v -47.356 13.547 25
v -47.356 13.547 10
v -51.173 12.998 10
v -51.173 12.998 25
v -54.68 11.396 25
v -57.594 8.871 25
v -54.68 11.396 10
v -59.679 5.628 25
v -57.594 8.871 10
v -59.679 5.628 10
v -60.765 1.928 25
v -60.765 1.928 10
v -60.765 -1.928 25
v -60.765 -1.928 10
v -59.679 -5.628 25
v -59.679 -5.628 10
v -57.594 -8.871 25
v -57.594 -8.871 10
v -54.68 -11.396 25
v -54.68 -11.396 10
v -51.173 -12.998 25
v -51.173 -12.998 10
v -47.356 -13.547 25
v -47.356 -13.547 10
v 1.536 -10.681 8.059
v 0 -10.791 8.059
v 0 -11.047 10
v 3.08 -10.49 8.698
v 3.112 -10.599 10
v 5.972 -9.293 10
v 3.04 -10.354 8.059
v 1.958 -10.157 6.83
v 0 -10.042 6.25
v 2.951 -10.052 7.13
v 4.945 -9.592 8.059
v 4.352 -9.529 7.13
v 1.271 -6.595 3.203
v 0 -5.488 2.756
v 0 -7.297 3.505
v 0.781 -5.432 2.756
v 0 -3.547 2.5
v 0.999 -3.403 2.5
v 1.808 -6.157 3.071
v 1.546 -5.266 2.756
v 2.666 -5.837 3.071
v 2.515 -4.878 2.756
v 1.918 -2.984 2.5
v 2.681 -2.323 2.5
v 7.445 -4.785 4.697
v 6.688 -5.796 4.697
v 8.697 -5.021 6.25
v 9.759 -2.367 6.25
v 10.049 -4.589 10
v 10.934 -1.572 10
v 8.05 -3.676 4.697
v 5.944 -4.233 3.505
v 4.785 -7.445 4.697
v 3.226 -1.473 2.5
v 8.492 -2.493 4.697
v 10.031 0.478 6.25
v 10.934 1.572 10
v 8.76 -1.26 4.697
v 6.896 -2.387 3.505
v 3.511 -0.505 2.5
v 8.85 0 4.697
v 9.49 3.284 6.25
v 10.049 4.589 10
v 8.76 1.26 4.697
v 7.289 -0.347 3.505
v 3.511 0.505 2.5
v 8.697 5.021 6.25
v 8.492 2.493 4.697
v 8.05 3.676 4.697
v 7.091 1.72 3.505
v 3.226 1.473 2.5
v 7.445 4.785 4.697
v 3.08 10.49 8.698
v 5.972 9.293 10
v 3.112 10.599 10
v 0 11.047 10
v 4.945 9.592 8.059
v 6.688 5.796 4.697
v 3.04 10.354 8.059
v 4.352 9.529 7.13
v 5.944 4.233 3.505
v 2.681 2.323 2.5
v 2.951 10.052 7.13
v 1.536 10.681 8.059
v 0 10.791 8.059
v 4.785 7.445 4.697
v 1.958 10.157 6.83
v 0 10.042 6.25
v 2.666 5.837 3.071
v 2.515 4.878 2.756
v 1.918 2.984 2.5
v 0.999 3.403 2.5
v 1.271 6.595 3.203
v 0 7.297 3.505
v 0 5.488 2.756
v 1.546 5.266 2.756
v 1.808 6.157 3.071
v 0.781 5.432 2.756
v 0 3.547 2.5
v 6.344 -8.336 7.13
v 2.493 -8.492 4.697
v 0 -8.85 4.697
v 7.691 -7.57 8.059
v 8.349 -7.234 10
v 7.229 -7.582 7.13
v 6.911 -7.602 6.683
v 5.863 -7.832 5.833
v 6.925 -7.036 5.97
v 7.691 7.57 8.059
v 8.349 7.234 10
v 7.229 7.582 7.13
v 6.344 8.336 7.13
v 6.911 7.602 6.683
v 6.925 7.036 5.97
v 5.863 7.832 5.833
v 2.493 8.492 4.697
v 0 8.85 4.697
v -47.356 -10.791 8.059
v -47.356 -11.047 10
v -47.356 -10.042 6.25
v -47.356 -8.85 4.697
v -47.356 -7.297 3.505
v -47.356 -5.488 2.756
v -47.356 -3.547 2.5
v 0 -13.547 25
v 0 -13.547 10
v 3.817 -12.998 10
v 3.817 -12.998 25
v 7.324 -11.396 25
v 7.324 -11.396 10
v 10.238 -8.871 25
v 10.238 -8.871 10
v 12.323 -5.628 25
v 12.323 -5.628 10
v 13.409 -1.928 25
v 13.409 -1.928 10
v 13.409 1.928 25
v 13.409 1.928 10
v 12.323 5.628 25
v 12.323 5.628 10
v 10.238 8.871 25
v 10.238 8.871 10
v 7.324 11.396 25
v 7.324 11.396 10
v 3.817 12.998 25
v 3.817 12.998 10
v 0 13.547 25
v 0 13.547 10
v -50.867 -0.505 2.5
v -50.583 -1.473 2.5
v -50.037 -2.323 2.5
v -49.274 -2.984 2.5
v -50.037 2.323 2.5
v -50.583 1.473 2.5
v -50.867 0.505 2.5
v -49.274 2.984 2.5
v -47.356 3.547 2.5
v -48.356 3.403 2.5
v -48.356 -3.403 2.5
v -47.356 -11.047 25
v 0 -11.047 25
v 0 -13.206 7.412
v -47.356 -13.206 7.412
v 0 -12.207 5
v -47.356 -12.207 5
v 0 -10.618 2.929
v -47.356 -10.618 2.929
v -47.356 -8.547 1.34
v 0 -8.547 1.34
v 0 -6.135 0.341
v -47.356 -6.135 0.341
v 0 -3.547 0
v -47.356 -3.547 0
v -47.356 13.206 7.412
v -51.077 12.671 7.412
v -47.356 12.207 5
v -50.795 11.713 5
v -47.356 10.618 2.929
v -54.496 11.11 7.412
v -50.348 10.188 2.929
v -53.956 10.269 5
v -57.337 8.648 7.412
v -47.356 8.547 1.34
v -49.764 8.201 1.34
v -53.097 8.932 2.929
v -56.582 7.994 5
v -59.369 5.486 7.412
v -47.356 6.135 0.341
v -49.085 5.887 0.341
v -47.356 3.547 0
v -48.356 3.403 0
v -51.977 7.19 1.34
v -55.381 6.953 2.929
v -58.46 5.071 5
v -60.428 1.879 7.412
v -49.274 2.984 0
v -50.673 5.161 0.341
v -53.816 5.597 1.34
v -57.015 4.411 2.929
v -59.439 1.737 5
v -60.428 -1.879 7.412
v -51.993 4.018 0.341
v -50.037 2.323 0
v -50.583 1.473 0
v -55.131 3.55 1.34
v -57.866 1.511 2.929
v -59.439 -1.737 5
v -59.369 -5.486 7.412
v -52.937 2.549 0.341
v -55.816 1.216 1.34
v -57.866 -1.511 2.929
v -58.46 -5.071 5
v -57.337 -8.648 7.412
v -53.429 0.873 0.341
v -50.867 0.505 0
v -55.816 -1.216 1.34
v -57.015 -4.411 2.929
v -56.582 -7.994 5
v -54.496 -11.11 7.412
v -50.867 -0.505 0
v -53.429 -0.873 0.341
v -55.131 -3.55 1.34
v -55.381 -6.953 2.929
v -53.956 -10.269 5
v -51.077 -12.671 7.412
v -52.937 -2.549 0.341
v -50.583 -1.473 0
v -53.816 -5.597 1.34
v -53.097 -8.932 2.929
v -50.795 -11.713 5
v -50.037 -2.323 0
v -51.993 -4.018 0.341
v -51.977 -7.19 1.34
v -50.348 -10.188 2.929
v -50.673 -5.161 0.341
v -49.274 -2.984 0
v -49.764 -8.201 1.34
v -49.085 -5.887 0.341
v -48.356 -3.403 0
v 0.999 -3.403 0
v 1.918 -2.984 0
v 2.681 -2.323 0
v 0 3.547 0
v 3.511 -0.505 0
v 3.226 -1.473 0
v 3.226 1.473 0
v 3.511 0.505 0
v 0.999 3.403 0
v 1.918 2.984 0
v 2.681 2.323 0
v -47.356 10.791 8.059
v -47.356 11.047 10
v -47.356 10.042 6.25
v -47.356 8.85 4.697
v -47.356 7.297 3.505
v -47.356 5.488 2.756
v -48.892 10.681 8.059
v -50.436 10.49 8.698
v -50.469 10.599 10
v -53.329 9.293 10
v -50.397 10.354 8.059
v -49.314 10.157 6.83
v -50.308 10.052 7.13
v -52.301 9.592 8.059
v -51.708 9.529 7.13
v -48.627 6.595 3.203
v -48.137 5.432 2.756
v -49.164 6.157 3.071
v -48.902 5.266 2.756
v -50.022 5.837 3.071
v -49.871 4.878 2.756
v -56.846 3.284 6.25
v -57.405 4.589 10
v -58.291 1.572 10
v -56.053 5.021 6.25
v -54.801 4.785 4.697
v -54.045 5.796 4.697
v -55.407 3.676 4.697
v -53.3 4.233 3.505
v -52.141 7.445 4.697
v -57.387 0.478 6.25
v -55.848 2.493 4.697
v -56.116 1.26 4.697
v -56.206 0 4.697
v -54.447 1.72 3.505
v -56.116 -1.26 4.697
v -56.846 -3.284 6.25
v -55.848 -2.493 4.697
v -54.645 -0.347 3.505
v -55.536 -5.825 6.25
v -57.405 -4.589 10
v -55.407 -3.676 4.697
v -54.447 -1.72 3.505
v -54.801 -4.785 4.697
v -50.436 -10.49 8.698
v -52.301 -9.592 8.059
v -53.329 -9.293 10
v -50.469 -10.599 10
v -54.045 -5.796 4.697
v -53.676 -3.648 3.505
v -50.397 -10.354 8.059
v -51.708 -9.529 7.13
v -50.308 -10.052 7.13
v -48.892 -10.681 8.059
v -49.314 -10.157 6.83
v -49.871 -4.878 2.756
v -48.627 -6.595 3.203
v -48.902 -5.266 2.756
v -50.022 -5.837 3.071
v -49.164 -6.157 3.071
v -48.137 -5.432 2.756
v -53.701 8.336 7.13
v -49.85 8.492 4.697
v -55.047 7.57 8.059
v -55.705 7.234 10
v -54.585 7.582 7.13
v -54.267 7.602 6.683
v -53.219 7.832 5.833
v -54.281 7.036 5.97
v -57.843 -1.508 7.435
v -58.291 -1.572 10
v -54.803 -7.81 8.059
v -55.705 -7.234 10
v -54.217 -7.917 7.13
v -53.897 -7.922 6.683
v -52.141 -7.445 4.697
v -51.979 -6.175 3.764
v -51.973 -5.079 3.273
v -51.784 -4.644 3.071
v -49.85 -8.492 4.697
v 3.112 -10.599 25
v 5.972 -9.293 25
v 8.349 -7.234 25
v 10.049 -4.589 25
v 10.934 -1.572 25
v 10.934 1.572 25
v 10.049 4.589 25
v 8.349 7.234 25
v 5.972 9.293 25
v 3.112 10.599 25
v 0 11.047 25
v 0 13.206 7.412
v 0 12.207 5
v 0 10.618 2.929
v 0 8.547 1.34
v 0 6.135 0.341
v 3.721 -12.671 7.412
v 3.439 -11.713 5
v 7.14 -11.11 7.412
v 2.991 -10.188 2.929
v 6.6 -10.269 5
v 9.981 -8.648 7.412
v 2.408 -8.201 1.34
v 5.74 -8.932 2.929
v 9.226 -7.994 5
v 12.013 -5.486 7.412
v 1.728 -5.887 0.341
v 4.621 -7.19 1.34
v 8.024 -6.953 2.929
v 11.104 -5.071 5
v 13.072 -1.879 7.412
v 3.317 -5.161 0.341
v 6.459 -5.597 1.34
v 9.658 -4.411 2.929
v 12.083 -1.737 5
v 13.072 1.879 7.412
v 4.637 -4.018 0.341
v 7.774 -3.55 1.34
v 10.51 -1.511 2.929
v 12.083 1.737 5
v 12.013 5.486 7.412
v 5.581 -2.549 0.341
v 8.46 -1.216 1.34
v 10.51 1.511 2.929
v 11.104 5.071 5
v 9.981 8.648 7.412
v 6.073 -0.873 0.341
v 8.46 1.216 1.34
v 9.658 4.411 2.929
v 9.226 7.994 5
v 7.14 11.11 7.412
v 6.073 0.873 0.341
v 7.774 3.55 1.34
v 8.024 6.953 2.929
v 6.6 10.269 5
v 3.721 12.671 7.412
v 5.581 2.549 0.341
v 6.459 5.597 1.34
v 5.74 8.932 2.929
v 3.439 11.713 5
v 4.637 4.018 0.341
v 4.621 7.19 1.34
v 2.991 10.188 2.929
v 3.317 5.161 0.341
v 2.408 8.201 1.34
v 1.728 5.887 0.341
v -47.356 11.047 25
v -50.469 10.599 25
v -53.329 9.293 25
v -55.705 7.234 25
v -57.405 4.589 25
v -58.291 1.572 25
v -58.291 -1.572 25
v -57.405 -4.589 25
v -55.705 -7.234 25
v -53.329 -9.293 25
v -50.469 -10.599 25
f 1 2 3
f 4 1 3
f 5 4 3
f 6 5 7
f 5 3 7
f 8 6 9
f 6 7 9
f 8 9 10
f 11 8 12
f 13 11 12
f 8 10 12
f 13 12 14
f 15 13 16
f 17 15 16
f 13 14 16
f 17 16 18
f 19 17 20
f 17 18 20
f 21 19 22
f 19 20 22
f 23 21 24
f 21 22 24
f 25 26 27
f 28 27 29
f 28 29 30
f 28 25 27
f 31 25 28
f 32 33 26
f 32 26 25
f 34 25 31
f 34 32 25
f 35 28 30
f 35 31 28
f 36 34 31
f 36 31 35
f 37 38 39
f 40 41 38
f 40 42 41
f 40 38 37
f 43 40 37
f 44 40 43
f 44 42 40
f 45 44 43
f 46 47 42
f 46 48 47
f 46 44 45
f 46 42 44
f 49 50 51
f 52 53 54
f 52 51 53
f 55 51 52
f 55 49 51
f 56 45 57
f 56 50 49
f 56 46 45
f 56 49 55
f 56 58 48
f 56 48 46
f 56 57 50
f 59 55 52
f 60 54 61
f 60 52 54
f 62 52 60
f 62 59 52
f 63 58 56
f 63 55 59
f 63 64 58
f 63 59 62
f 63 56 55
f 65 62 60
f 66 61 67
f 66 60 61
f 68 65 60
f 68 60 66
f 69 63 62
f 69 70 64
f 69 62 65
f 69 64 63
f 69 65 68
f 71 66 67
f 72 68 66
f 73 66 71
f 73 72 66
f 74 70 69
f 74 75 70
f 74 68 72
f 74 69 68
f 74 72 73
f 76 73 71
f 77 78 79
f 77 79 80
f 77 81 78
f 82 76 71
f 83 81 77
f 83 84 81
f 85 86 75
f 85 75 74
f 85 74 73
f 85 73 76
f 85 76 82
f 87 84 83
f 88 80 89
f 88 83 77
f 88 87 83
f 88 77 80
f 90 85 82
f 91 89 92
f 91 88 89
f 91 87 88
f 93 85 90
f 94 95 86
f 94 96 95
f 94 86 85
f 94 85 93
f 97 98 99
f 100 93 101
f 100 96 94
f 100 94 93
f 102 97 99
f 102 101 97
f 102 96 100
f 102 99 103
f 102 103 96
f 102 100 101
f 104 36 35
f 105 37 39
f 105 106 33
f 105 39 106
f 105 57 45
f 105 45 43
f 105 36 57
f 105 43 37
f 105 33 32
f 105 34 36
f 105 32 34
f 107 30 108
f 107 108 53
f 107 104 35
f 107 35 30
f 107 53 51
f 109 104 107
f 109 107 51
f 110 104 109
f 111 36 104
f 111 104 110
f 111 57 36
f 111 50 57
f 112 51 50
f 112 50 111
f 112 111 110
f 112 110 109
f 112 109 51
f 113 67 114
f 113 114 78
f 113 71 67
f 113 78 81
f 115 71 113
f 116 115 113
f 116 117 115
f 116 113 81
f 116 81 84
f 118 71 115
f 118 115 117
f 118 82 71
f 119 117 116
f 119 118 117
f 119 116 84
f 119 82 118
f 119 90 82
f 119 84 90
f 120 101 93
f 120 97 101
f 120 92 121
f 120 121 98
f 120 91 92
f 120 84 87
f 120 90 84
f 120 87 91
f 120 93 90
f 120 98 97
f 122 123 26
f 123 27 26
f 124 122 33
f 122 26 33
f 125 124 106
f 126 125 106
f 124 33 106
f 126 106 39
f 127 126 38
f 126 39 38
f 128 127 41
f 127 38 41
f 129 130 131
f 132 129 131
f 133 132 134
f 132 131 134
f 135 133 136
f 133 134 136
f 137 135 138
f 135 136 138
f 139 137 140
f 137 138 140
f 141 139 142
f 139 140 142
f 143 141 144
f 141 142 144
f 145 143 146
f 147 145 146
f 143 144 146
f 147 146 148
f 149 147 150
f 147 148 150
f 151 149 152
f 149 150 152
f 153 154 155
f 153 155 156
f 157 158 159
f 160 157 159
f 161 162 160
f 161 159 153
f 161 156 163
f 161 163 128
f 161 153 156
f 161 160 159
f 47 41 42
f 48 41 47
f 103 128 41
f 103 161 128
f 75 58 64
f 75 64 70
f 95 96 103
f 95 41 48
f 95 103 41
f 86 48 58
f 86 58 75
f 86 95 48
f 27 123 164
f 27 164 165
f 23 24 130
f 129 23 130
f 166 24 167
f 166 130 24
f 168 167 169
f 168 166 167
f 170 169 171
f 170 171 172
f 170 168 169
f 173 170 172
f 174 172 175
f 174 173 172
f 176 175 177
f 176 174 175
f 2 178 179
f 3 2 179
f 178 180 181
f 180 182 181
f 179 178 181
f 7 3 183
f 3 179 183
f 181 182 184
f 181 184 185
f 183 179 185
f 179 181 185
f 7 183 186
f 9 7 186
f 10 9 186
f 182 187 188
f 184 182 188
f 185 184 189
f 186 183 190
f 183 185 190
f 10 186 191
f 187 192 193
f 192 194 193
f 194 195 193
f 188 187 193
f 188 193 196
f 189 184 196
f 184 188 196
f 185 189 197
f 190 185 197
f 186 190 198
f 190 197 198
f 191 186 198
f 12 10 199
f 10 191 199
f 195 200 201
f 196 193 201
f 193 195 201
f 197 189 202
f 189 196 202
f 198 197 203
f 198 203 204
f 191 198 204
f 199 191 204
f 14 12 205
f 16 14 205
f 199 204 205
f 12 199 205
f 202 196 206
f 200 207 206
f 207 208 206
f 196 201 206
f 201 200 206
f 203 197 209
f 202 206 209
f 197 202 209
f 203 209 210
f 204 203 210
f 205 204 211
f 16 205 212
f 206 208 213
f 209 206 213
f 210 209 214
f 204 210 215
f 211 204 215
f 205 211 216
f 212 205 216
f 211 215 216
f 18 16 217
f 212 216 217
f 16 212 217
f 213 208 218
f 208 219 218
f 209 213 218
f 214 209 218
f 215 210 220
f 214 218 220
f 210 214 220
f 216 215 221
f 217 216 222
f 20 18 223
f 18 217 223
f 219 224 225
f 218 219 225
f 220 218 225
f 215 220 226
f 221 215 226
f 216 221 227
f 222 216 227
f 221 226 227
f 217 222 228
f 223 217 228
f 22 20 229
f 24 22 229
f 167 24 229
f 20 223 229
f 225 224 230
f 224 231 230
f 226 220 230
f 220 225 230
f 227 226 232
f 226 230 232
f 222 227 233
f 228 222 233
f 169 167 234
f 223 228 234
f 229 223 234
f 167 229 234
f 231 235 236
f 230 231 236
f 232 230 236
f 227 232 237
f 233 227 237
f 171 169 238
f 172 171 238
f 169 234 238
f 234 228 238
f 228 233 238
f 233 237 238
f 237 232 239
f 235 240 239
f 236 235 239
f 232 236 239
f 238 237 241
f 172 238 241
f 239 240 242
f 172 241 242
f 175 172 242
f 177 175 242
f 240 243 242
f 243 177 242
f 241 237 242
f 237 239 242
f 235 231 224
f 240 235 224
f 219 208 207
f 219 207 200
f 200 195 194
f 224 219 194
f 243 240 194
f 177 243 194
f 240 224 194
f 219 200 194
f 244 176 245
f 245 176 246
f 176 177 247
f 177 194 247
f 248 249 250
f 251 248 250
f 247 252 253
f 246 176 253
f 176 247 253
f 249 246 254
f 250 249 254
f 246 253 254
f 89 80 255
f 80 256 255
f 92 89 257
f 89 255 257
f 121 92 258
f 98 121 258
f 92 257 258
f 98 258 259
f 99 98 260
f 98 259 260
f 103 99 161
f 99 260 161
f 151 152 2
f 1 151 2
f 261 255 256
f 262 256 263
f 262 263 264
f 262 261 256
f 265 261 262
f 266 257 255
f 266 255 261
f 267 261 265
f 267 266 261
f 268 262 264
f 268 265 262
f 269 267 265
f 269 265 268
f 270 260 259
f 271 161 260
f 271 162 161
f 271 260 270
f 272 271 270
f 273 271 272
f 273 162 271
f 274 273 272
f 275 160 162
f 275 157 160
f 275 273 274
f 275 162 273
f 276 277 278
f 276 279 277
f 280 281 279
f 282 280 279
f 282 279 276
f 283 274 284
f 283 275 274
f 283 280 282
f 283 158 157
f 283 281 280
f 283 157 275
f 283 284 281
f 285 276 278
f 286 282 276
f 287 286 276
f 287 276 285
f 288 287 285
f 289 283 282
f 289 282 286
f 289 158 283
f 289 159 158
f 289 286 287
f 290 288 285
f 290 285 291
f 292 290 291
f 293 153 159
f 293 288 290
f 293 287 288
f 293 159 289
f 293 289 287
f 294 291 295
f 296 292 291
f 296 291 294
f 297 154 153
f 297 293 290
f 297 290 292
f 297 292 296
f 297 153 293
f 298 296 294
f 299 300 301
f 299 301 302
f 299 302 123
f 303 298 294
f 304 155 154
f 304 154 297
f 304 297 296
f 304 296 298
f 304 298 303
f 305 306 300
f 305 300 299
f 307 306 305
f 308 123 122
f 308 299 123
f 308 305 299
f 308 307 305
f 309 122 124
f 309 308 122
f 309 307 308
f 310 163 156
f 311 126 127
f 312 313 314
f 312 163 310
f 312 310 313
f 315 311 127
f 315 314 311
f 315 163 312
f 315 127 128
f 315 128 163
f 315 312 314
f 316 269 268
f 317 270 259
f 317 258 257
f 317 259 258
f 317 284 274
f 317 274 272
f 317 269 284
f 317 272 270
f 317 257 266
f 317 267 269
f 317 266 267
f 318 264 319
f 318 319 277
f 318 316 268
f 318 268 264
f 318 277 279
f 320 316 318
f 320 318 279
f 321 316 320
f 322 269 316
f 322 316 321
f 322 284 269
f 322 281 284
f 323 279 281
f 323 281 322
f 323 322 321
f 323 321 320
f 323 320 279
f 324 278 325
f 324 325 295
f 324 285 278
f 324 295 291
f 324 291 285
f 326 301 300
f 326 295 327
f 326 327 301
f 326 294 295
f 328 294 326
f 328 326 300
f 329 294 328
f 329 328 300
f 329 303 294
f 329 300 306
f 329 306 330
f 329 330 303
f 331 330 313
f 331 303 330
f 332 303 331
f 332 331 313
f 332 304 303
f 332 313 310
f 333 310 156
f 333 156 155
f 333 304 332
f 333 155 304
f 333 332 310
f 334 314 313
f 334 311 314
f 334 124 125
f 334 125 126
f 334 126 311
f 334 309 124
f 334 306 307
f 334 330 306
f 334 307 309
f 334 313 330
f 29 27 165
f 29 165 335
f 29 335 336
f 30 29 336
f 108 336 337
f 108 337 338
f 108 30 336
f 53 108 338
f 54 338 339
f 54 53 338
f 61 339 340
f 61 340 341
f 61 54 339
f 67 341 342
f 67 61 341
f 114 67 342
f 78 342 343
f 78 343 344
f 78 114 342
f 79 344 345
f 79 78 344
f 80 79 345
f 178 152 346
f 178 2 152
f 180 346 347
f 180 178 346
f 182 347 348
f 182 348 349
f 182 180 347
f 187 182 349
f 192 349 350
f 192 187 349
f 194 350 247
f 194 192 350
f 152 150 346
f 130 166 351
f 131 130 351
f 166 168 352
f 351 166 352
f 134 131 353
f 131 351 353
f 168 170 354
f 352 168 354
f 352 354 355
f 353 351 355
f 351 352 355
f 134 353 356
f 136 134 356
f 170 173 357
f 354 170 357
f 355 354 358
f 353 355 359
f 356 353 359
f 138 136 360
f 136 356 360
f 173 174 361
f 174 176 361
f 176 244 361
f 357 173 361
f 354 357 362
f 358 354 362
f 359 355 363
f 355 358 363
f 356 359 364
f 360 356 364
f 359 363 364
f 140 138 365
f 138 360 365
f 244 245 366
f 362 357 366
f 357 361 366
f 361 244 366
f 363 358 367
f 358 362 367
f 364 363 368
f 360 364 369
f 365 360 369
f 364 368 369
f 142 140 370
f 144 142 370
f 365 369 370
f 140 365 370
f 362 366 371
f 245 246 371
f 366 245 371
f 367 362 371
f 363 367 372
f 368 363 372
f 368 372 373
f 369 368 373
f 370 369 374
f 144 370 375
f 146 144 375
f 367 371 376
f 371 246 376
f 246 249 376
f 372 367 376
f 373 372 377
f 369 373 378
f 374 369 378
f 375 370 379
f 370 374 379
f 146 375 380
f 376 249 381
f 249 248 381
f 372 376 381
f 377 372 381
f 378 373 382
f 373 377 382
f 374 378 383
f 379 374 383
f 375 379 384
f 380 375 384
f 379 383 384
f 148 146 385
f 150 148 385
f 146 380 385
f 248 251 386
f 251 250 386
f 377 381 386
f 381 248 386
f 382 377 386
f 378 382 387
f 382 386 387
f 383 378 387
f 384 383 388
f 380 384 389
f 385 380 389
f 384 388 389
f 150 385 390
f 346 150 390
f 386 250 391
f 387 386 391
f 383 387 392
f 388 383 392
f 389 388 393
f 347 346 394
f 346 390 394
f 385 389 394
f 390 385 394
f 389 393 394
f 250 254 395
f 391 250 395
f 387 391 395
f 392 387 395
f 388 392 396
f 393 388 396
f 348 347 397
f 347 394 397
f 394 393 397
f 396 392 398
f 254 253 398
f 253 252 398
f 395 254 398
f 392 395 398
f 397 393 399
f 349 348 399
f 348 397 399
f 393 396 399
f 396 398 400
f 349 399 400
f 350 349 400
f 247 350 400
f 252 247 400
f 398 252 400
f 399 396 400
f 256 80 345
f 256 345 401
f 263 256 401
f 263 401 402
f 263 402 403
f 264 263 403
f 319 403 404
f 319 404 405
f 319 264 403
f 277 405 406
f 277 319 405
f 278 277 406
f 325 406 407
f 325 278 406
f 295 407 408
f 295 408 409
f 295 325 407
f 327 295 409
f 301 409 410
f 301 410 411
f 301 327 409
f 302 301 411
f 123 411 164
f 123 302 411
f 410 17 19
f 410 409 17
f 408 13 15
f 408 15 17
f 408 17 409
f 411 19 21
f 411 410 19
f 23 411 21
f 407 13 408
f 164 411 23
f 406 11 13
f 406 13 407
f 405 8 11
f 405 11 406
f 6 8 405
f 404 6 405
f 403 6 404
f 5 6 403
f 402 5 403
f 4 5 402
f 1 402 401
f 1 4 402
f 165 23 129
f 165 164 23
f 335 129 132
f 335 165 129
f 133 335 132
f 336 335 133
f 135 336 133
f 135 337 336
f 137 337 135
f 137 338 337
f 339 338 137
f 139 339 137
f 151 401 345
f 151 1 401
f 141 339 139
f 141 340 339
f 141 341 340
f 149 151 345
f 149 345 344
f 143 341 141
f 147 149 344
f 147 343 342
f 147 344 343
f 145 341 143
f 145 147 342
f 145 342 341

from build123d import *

# Parameters (mm, degrees)
F1_DEPTH = 25
F2_DEPTH = 25
F3_R     = 10
F4_T     = -2.5


with BuildPart() as f1:
    # F0 (on Top) → F1 (new body)
    with BuildSketch(Plane.XY):
        with BuildLine():
            Line((-47.356255, -13.546846), (0, -13.546846))
            ThreePointArc((0, -13.546846), (13.546846, 0), (0, 13.546846))
            Line((0, 13.546846), (-47.356255, 13.546846))
            ThreePointArc((-47.356255, 13.546846), (-60.903101, 0), (-47.356255, -13.546846))
        make_face()
    extrude(amount=F1_DEPTH)

    # F0 (on Top) → F2 (join)
    with BuildSketch(Plane.XY):
        with BuildLine():
            Line((-47.356255, -13.546846), (0, -13.546846))
            ThreePointArc((0, -13.546846), (13.546846, 0), (0, 13.546846))
            Line((0, 13.546846), (-47.356255, 13.546846))
            ThreePointArc((-47.356255, 13.546846), (-60.903101, 0), (-47.356255, -13.546846))
        make_face()
    extrude(amount=F2_DEPTH)

    # F3
    f3_edges = [f1.edges().sort_by_distance(p)[0] for p in [
        (-60.903101, 0, 0),
    ]]
    fillet(f3_edges, radius=F3_R)

    # F4
    f4_openings = [f1.faces().sort_by_distance(p)[0] for p in [
        (-23.678128, 0, 25),
    ]]
    offset(amount=F4_T, openings=f4_openings)


solid = f1.part
